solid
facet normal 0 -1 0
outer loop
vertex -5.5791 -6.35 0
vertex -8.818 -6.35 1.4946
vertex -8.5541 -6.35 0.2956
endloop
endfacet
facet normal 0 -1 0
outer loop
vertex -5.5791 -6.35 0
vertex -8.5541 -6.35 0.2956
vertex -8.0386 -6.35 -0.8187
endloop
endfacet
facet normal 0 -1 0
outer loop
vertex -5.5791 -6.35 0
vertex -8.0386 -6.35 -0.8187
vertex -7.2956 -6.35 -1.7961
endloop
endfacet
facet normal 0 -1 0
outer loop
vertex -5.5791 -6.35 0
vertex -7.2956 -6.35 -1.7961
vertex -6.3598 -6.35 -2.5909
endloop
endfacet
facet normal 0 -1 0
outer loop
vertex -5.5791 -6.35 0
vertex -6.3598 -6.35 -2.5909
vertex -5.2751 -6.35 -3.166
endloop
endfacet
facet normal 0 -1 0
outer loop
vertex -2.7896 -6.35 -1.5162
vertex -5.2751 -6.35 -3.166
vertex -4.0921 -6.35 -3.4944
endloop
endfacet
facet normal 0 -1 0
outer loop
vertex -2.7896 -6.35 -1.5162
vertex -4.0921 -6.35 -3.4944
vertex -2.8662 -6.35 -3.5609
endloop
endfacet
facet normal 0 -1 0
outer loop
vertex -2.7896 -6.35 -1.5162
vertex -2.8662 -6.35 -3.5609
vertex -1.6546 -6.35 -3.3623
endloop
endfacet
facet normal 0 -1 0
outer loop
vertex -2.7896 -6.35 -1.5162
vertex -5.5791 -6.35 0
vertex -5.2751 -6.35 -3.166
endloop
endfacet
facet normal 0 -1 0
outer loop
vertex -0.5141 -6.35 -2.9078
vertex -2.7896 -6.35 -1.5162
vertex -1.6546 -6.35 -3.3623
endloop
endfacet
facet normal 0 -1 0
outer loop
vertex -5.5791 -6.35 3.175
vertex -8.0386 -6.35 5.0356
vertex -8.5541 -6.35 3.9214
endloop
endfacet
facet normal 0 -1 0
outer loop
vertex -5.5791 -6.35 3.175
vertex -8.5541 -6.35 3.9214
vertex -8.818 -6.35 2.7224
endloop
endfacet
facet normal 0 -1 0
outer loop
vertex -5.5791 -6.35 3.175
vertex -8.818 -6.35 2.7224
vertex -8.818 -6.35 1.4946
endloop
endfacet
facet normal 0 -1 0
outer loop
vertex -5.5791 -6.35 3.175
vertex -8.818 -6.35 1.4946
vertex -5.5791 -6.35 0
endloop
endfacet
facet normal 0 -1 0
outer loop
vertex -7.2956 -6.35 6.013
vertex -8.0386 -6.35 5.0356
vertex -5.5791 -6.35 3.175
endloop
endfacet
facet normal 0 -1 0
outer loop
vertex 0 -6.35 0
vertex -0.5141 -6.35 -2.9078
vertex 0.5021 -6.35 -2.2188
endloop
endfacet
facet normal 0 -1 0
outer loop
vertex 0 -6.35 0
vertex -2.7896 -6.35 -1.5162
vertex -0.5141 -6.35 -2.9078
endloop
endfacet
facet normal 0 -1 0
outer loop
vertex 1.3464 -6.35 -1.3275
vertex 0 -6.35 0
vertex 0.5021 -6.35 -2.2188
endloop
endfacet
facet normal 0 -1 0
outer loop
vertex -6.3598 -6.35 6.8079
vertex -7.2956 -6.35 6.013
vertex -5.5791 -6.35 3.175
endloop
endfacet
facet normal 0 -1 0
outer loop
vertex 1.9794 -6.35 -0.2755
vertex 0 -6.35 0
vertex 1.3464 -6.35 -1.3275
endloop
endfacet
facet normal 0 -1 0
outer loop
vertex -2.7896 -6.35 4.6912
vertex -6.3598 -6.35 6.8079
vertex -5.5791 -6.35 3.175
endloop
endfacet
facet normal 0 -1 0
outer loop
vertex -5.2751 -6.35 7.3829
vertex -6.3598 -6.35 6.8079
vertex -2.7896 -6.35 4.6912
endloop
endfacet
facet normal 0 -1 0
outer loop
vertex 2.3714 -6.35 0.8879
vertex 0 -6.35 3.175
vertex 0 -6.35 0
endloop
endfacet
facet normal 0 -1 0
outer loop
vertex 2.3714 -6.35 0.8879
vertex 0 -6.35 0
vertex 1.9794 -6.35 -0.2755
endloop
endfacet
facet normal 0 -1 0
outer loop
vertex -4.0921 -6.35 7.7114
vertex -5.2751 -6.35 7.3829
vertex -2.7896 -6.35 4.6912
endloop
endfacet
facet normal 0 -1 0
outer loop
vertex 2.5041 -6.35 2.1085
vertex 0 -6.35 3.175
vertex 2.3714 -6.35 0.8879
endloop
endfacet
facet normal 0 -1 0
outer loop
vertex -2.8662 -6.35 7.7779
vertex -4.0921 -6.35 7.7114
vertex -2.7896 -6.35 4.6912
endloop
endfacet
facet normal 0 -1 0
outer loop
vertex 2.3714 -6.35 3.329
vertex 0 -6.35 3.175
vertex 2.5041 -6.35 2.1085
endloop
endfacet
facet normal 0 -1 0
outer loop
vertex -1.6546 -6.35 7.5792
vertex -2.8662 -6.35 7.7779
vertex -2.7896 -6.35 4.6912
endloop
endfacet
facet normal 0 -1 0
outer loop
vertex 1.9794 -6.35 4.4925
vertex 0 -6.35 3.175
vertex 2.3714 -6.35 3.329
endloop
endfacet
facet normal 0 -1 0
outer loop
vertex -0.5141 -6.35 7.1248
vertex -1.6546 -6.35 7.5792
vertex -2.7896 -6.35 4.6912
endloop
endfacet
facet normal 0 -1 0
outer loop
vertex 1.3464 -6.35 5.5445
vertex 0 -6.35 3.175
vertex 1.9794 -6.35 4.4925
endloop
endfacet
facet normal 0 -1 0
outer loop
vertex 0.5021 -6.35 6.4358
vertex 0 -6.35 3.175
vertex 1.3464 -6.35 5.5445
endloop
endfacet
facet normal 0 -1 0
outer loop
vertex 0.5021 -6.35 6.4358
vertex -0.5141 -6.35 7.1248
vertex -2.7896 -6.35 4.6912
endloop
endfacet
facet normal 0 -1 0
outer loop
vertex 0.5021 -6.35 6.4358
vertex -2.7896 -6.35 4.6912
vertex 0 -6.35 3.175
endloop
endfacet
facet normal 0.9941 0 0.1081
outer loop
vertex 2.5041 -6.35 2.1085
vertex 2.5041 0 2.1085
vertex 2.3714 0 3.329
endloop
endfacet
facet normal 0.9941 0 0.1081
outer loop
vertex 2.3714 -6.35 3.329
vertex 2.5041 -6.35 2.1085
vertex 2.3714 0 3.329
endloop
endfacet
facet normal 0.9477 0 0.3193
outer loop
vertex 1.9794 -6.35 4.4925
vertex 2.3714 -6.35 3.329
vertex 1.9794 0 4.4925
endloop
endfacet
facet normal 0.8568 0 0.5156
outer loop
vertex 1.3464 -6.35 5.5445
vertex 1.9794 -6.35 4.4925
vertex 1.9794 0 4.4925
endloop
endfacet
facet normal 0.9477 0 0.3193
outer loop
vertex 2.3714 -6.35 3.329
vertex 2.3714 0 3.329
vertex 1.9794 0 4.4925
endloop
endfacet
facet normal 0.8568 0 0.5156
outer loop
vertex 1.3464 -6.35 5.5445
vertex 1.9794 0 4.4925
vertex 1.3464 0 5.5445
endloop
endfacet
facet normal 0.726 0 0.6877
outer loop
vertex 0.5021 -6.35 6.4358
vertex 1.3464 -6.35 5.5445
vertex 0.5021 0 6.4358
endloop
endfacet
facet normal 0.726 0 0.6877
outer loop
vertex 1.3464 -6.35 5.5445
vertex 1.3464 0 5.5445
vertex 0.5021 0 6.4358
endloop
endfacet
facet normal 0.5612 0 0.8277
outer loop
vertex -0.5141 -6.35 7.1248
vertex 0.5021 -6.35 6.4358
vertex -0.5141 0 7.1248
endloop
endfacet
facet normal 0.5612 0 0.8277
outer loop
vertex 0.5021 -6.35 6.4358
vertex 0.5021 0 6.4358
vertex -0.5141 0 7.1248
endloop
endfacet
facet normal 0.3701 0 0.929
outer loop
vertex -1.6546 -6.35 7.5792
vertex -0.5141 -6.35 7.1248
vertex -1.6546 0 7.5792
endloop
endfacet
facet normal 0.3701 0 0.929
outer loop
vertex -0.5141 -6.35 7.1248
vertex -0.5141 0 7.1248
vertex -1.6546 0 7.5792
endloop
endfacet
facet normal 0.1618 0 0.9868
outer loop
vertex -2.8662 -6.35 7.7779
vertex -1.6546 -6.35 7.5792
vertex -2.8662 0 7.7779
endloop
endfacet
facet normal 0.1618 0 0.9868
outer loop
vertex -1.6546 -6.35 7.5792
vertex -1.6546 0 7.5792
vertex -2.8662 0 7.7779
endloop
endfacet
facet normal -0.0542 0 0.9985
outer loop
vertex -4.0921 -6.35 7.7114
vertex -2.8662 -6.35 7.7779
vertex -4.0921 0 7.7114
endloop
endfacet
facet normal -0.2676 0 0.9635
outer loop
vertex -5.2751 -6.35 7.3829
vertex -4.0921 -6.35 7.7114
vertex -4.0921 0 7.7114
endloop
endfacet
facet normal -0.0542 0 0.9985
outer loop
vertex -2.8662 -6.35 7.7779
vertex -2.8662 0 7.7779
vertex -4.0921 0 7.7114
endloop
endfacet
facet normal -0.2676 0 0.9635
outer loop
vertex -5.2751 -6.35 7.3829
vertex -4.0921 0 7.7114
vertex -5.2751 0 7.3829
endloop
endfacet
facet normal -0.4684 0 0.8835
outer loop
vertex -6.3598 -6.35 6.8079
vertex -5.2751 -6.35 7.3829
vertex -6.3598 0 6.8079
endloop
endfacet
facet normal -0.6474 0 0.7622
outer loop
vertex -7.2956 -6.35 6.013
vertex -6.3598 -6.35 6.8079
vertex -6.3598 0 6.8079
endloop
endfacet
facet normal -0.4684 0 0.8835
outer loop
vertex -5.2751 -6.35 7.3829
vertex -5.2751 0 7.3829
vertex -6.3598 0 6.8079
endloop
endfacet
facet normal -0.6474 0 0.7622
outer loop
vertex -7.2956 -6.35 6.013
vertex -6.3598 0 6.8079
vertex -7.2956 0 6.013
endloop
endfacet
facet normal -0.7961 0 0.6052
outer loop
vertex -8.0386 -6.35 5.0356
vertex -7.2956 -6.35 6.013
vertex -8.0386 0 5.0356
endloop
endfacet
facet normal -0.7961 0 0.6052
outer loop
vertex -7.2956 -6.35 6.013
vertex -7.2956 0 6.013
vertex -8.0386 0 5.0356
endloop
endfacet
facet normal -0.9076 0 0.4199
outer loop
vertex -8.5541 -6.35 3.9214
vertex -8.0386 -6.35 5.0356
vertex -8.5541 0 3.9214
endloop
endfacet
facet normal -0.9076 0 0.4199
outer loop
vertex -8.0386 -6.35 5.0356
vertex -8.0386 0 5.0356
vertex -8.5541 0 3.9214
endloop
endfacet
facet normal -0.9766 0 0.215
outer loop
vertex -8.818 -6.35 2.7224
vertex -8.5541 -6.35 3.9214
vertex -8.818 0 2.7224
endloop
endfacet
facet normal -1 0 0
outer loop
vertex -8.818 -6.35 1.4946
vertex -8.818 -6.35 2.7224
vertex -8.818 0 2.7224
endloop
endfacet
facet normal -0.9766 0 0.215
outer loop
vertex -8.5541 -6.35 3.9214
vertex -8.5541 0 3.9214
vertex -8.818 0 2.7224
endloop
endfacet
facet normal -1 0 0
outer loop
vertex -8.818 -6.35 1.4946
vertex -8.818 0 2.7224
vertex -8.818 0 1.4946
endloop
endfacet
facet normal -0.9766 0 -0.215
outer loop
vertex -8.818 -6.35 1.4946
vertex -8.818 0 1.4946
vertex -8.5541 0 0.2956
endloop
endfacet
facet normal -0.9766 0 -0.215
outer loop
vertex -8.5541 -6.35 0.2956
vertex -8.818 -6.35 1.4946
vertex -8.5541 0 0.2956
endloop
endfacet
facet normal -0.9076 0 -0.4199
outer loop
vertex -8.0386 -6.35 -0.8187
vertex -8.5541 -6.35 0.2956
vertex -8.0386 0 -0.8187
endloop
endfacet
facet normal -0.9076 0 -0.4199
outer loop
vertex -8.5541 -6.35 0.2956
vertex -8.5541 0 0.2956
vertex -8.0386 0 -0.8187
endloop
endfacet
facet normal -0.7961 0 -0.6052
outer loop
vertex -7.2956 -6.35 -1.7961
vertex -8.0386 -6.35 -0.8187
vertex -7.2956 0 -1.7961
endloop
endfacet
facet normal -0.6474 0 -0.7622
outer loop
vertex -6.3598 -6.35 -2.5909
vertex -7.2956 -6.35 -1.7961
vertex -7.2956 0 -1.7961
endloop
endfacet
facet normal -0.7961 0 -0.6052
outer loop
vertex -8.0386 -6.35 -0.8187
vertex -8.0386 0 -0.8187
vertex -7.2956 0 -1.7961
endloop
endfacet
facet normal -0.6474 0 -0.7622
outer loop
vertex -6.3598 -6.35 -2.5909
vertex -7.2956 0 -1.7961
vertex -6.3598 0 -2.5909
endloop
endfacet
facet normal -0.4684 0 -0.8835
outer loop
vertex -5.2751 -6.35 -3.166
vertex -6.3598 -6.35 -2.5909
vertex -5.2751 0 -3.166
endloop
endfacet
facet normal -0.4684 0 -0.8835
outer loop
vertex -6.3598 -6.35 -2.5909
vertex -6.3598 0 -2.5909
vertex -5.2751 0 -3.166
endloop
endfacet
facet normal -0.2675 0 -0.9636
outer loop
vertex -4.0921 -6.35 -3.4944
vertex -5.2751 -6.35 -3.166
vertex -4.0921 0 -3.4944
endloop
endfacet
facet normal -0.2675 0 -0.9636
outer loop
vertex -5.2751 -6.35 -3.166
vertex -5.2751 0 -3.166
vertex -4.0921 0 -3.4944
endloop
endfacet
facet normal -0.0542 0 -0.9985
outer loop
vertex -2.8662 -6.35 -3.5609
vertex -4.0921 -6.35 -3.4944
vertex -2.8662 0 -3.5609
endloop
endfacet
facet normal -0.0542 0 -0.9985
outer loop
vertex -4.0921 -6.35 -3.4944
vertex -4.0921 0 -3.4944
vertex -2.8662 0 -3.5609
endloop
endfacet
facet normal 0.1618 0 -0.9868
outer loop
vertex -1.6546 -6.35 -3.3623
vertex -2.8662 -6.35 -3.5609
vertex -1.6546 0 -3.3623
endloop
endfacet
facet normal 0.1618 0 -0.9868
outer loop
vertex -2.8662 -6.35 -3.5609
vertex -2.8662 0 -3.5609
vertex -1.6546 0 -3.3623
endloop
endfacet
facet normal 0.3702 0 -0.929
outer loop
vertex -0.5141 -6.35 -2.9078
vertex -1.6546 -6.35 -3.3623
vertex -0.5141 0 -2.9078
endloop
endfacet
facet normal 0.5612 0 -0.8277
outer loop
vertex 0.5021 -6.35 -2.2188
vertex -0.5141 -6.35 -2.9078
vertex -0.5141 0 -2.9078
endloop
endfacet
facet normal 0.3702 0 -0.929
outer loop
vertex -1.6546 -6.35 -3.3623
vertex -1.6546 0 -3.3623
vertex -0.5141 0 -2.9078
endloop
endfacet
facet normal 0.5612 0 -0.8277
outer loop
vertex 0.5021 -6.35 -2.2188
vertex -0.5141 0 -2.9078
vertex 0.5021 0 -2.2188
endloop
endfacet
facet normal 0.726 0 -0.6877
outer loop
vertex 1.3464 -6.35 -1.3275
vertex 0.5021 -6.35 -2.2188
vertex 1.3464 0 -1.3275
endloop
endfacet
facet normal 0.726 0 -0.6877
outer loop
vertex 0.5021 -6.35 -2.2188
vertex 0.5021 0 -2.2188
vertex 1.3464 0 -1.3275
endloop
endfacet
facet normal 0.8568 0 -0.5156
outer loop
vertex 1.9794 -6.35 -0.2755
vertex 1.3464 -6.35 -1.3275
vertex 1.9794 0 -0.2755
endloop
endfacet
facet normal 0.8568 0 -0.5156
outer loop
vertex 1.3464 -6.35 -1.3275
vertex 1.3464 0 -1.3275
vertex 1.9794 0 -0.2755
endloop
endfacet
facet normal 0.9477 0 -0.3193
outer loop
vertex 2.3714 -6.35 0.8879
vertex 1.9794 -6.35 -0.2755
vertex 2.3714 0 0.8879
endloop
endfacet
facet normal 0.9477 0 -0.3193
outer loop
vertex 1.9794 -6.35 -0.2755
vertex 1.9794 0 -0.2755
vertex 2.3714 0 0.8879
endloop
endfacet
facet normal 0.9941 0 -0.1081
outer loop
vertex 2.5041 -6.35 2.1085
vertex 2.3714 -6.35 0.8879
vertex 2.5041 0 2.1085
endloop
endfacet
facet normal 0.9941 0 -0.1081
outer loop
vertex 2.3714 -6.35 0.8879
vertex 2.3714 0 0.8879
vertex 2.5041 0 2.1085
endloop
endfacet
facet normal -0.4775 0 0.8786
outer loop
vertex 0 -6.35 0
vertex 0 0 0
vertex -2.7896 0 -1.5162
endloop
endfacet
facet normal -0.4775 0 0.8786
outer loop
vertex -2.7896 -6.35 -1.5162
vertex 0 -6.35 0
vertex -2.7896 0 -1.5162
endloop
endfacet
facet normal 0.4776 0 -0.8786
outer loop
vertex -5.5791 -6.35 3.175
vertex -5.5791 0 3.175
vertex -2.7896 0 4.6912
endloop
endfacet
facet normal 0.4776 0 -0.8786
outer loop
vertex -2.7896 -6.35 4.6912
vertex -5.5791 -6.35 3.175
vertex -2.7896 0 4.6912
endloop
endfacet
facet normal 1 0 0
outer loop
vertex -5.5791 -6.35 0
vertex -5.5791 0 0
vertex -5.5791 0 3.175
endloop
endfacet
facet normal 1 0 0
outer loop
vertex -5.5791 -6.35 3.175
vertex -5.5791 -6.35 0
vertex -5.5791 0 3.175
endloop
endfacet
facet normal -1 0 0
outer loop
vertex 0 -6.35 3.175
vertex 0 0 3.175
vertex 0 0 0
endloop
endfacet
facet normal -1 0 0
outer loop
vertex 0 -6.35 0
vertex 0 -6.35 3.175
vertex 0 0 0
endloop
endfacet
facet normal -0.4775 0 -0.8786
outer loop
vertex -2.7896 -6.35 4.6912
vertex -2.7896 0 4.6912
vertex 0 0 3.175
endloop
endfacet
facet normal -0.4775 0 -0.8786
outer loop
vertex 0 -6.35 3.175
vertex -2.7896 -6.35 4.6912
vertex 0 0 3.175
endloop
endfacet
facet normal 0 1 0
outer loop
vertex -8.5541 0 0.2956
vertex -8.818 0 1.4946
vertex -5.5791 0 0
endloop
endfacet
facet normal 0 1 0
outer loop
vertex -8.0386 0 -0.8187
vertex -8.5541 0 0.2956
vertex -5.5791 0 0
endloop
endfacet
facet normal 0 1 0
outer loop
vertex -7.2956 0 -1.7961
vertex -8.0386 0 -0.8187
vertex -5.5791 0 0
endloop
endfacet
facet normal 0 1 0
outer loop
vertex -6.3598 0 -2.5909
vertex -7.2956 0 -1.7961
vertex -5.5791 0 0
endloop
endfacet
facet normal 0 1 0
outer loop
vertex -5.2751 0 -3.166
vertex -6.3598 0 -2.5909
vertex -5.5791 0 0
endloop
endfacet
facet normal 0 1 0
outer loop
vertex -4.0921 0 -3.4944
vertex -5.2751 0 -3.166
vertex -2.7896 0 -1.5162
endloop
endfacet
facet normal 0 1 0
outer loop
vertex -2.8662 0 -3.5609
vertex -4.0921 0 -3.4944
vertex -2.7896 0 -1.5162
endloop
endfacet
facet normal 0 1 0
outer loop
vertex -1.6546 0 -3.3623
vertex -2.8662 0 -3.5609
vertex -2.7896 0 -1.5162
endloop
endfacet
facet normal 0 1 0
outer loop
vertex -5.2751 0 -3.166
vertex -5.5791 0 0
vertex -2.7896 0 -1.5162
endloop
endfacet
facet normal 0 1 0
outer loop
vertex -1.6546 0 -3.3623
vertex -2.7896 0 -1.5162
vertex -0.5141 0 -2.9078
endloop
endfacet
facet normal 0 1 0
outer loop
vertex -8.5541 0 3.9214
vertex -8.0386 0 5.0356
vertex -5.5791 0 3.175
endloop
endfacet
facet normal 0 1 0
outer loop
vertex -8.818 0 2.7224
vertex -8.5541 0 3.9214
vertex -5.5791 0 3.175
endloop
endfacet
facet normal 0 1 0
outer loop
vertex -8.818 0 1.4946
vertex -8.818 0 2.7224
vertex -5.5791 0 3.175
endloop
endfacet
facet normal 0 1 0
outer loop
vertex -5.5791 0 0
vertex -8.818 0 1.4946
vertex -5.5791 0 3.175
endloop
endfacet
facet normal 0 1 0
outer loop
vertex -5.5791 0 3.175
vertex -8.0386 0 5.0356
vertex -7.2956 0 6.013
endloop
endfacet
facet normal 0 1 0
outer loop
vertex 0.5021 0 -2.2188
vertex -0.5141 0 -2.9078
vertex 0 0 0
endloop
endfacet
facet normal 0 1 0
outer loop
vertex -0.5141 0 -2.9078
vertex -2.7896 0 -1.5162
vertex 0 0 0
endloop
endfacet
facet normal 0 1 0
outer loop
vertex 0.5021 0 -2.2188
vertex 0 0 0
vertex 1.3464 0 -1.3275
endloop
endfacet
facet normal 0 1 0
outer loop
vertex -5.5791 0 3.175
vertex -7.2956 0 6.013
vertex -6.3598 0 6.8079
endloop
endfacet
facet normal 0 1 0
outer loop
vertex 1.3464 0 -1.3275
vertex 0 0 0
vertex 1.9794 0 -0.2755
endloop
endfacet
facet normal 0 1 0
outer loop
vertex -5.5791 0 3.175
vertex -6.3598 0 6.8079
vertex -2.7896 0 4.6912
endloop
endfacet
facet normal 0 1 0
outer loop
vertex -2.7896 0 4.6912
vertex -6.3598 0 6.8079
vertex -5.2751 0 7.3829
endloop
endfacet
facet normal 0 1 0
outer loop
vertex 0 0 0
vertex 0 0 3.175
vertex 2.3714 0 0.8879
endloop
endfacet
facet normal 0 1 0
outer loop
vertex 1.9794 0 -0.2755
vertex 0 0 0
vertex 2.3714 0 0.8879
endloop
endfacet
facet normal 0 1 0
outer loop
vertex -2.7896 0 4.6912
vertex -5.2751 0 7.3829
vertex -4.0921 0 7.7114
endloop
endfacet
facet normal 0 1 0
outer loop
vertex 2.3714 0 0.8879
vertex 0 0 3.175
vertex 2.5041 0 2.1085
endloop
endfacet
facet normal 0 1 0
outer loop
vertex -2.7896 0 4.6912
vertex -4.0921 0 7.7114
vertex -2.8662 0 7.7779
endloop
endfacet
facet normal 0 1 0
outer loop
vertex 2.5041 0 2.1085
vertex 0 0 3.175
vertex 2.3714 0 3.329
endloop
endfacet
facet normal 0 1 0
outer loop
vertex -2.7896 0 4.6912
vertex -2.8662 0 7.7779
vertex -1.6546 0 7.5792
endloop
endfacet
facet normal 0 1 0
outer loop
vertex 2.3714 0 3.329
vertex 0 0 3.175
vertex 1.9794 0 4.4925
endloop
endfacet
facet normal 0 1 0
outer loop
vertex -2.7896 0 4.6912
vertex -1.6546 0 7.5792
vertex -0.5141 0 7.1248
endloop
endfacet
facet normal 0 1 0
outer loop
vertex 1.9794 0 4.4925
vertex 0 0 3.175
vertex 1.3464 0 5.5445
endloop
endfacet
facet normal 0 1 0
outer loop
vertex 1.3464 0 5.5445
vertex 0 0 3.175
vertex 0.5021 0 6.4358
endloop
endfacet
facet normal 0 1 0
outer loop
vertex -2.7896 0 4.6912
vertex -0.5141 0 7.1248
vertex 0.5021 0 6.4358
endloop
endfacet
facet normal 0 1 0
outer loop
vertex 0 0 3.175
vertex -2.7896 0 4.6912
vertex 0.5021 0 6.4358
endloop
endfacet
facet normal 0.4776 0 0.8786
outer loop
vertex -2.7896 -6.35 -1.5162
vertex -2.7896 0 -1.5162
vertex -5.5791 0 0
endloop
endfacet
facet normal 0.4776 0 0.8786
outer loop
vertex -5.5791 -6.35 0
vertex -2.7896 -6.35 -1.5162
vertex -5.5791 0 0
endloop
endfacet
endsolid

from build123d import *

# Parameters (mm, degrees)
F0_R     = 5.677699
F1_DEPTH = 6.35


with BuildPart() as f1:
    # F0 (on Front) → F1 (new body)
    with BuildSketch(Plane.XZ):
        with Locations((-3.173587, 2.108483)):
            Circle(F0_R)
        Polygon((-5.57913, 0), (-5.57913, 3.175), (-2.789565, 4.691229), (0, 3.175), (0, 0), (-2.789565, -1.516229), align=None, mode=Mode.SUBTRACT)
    extrude(amount=F1_DEPTH)


solid = f1.part
